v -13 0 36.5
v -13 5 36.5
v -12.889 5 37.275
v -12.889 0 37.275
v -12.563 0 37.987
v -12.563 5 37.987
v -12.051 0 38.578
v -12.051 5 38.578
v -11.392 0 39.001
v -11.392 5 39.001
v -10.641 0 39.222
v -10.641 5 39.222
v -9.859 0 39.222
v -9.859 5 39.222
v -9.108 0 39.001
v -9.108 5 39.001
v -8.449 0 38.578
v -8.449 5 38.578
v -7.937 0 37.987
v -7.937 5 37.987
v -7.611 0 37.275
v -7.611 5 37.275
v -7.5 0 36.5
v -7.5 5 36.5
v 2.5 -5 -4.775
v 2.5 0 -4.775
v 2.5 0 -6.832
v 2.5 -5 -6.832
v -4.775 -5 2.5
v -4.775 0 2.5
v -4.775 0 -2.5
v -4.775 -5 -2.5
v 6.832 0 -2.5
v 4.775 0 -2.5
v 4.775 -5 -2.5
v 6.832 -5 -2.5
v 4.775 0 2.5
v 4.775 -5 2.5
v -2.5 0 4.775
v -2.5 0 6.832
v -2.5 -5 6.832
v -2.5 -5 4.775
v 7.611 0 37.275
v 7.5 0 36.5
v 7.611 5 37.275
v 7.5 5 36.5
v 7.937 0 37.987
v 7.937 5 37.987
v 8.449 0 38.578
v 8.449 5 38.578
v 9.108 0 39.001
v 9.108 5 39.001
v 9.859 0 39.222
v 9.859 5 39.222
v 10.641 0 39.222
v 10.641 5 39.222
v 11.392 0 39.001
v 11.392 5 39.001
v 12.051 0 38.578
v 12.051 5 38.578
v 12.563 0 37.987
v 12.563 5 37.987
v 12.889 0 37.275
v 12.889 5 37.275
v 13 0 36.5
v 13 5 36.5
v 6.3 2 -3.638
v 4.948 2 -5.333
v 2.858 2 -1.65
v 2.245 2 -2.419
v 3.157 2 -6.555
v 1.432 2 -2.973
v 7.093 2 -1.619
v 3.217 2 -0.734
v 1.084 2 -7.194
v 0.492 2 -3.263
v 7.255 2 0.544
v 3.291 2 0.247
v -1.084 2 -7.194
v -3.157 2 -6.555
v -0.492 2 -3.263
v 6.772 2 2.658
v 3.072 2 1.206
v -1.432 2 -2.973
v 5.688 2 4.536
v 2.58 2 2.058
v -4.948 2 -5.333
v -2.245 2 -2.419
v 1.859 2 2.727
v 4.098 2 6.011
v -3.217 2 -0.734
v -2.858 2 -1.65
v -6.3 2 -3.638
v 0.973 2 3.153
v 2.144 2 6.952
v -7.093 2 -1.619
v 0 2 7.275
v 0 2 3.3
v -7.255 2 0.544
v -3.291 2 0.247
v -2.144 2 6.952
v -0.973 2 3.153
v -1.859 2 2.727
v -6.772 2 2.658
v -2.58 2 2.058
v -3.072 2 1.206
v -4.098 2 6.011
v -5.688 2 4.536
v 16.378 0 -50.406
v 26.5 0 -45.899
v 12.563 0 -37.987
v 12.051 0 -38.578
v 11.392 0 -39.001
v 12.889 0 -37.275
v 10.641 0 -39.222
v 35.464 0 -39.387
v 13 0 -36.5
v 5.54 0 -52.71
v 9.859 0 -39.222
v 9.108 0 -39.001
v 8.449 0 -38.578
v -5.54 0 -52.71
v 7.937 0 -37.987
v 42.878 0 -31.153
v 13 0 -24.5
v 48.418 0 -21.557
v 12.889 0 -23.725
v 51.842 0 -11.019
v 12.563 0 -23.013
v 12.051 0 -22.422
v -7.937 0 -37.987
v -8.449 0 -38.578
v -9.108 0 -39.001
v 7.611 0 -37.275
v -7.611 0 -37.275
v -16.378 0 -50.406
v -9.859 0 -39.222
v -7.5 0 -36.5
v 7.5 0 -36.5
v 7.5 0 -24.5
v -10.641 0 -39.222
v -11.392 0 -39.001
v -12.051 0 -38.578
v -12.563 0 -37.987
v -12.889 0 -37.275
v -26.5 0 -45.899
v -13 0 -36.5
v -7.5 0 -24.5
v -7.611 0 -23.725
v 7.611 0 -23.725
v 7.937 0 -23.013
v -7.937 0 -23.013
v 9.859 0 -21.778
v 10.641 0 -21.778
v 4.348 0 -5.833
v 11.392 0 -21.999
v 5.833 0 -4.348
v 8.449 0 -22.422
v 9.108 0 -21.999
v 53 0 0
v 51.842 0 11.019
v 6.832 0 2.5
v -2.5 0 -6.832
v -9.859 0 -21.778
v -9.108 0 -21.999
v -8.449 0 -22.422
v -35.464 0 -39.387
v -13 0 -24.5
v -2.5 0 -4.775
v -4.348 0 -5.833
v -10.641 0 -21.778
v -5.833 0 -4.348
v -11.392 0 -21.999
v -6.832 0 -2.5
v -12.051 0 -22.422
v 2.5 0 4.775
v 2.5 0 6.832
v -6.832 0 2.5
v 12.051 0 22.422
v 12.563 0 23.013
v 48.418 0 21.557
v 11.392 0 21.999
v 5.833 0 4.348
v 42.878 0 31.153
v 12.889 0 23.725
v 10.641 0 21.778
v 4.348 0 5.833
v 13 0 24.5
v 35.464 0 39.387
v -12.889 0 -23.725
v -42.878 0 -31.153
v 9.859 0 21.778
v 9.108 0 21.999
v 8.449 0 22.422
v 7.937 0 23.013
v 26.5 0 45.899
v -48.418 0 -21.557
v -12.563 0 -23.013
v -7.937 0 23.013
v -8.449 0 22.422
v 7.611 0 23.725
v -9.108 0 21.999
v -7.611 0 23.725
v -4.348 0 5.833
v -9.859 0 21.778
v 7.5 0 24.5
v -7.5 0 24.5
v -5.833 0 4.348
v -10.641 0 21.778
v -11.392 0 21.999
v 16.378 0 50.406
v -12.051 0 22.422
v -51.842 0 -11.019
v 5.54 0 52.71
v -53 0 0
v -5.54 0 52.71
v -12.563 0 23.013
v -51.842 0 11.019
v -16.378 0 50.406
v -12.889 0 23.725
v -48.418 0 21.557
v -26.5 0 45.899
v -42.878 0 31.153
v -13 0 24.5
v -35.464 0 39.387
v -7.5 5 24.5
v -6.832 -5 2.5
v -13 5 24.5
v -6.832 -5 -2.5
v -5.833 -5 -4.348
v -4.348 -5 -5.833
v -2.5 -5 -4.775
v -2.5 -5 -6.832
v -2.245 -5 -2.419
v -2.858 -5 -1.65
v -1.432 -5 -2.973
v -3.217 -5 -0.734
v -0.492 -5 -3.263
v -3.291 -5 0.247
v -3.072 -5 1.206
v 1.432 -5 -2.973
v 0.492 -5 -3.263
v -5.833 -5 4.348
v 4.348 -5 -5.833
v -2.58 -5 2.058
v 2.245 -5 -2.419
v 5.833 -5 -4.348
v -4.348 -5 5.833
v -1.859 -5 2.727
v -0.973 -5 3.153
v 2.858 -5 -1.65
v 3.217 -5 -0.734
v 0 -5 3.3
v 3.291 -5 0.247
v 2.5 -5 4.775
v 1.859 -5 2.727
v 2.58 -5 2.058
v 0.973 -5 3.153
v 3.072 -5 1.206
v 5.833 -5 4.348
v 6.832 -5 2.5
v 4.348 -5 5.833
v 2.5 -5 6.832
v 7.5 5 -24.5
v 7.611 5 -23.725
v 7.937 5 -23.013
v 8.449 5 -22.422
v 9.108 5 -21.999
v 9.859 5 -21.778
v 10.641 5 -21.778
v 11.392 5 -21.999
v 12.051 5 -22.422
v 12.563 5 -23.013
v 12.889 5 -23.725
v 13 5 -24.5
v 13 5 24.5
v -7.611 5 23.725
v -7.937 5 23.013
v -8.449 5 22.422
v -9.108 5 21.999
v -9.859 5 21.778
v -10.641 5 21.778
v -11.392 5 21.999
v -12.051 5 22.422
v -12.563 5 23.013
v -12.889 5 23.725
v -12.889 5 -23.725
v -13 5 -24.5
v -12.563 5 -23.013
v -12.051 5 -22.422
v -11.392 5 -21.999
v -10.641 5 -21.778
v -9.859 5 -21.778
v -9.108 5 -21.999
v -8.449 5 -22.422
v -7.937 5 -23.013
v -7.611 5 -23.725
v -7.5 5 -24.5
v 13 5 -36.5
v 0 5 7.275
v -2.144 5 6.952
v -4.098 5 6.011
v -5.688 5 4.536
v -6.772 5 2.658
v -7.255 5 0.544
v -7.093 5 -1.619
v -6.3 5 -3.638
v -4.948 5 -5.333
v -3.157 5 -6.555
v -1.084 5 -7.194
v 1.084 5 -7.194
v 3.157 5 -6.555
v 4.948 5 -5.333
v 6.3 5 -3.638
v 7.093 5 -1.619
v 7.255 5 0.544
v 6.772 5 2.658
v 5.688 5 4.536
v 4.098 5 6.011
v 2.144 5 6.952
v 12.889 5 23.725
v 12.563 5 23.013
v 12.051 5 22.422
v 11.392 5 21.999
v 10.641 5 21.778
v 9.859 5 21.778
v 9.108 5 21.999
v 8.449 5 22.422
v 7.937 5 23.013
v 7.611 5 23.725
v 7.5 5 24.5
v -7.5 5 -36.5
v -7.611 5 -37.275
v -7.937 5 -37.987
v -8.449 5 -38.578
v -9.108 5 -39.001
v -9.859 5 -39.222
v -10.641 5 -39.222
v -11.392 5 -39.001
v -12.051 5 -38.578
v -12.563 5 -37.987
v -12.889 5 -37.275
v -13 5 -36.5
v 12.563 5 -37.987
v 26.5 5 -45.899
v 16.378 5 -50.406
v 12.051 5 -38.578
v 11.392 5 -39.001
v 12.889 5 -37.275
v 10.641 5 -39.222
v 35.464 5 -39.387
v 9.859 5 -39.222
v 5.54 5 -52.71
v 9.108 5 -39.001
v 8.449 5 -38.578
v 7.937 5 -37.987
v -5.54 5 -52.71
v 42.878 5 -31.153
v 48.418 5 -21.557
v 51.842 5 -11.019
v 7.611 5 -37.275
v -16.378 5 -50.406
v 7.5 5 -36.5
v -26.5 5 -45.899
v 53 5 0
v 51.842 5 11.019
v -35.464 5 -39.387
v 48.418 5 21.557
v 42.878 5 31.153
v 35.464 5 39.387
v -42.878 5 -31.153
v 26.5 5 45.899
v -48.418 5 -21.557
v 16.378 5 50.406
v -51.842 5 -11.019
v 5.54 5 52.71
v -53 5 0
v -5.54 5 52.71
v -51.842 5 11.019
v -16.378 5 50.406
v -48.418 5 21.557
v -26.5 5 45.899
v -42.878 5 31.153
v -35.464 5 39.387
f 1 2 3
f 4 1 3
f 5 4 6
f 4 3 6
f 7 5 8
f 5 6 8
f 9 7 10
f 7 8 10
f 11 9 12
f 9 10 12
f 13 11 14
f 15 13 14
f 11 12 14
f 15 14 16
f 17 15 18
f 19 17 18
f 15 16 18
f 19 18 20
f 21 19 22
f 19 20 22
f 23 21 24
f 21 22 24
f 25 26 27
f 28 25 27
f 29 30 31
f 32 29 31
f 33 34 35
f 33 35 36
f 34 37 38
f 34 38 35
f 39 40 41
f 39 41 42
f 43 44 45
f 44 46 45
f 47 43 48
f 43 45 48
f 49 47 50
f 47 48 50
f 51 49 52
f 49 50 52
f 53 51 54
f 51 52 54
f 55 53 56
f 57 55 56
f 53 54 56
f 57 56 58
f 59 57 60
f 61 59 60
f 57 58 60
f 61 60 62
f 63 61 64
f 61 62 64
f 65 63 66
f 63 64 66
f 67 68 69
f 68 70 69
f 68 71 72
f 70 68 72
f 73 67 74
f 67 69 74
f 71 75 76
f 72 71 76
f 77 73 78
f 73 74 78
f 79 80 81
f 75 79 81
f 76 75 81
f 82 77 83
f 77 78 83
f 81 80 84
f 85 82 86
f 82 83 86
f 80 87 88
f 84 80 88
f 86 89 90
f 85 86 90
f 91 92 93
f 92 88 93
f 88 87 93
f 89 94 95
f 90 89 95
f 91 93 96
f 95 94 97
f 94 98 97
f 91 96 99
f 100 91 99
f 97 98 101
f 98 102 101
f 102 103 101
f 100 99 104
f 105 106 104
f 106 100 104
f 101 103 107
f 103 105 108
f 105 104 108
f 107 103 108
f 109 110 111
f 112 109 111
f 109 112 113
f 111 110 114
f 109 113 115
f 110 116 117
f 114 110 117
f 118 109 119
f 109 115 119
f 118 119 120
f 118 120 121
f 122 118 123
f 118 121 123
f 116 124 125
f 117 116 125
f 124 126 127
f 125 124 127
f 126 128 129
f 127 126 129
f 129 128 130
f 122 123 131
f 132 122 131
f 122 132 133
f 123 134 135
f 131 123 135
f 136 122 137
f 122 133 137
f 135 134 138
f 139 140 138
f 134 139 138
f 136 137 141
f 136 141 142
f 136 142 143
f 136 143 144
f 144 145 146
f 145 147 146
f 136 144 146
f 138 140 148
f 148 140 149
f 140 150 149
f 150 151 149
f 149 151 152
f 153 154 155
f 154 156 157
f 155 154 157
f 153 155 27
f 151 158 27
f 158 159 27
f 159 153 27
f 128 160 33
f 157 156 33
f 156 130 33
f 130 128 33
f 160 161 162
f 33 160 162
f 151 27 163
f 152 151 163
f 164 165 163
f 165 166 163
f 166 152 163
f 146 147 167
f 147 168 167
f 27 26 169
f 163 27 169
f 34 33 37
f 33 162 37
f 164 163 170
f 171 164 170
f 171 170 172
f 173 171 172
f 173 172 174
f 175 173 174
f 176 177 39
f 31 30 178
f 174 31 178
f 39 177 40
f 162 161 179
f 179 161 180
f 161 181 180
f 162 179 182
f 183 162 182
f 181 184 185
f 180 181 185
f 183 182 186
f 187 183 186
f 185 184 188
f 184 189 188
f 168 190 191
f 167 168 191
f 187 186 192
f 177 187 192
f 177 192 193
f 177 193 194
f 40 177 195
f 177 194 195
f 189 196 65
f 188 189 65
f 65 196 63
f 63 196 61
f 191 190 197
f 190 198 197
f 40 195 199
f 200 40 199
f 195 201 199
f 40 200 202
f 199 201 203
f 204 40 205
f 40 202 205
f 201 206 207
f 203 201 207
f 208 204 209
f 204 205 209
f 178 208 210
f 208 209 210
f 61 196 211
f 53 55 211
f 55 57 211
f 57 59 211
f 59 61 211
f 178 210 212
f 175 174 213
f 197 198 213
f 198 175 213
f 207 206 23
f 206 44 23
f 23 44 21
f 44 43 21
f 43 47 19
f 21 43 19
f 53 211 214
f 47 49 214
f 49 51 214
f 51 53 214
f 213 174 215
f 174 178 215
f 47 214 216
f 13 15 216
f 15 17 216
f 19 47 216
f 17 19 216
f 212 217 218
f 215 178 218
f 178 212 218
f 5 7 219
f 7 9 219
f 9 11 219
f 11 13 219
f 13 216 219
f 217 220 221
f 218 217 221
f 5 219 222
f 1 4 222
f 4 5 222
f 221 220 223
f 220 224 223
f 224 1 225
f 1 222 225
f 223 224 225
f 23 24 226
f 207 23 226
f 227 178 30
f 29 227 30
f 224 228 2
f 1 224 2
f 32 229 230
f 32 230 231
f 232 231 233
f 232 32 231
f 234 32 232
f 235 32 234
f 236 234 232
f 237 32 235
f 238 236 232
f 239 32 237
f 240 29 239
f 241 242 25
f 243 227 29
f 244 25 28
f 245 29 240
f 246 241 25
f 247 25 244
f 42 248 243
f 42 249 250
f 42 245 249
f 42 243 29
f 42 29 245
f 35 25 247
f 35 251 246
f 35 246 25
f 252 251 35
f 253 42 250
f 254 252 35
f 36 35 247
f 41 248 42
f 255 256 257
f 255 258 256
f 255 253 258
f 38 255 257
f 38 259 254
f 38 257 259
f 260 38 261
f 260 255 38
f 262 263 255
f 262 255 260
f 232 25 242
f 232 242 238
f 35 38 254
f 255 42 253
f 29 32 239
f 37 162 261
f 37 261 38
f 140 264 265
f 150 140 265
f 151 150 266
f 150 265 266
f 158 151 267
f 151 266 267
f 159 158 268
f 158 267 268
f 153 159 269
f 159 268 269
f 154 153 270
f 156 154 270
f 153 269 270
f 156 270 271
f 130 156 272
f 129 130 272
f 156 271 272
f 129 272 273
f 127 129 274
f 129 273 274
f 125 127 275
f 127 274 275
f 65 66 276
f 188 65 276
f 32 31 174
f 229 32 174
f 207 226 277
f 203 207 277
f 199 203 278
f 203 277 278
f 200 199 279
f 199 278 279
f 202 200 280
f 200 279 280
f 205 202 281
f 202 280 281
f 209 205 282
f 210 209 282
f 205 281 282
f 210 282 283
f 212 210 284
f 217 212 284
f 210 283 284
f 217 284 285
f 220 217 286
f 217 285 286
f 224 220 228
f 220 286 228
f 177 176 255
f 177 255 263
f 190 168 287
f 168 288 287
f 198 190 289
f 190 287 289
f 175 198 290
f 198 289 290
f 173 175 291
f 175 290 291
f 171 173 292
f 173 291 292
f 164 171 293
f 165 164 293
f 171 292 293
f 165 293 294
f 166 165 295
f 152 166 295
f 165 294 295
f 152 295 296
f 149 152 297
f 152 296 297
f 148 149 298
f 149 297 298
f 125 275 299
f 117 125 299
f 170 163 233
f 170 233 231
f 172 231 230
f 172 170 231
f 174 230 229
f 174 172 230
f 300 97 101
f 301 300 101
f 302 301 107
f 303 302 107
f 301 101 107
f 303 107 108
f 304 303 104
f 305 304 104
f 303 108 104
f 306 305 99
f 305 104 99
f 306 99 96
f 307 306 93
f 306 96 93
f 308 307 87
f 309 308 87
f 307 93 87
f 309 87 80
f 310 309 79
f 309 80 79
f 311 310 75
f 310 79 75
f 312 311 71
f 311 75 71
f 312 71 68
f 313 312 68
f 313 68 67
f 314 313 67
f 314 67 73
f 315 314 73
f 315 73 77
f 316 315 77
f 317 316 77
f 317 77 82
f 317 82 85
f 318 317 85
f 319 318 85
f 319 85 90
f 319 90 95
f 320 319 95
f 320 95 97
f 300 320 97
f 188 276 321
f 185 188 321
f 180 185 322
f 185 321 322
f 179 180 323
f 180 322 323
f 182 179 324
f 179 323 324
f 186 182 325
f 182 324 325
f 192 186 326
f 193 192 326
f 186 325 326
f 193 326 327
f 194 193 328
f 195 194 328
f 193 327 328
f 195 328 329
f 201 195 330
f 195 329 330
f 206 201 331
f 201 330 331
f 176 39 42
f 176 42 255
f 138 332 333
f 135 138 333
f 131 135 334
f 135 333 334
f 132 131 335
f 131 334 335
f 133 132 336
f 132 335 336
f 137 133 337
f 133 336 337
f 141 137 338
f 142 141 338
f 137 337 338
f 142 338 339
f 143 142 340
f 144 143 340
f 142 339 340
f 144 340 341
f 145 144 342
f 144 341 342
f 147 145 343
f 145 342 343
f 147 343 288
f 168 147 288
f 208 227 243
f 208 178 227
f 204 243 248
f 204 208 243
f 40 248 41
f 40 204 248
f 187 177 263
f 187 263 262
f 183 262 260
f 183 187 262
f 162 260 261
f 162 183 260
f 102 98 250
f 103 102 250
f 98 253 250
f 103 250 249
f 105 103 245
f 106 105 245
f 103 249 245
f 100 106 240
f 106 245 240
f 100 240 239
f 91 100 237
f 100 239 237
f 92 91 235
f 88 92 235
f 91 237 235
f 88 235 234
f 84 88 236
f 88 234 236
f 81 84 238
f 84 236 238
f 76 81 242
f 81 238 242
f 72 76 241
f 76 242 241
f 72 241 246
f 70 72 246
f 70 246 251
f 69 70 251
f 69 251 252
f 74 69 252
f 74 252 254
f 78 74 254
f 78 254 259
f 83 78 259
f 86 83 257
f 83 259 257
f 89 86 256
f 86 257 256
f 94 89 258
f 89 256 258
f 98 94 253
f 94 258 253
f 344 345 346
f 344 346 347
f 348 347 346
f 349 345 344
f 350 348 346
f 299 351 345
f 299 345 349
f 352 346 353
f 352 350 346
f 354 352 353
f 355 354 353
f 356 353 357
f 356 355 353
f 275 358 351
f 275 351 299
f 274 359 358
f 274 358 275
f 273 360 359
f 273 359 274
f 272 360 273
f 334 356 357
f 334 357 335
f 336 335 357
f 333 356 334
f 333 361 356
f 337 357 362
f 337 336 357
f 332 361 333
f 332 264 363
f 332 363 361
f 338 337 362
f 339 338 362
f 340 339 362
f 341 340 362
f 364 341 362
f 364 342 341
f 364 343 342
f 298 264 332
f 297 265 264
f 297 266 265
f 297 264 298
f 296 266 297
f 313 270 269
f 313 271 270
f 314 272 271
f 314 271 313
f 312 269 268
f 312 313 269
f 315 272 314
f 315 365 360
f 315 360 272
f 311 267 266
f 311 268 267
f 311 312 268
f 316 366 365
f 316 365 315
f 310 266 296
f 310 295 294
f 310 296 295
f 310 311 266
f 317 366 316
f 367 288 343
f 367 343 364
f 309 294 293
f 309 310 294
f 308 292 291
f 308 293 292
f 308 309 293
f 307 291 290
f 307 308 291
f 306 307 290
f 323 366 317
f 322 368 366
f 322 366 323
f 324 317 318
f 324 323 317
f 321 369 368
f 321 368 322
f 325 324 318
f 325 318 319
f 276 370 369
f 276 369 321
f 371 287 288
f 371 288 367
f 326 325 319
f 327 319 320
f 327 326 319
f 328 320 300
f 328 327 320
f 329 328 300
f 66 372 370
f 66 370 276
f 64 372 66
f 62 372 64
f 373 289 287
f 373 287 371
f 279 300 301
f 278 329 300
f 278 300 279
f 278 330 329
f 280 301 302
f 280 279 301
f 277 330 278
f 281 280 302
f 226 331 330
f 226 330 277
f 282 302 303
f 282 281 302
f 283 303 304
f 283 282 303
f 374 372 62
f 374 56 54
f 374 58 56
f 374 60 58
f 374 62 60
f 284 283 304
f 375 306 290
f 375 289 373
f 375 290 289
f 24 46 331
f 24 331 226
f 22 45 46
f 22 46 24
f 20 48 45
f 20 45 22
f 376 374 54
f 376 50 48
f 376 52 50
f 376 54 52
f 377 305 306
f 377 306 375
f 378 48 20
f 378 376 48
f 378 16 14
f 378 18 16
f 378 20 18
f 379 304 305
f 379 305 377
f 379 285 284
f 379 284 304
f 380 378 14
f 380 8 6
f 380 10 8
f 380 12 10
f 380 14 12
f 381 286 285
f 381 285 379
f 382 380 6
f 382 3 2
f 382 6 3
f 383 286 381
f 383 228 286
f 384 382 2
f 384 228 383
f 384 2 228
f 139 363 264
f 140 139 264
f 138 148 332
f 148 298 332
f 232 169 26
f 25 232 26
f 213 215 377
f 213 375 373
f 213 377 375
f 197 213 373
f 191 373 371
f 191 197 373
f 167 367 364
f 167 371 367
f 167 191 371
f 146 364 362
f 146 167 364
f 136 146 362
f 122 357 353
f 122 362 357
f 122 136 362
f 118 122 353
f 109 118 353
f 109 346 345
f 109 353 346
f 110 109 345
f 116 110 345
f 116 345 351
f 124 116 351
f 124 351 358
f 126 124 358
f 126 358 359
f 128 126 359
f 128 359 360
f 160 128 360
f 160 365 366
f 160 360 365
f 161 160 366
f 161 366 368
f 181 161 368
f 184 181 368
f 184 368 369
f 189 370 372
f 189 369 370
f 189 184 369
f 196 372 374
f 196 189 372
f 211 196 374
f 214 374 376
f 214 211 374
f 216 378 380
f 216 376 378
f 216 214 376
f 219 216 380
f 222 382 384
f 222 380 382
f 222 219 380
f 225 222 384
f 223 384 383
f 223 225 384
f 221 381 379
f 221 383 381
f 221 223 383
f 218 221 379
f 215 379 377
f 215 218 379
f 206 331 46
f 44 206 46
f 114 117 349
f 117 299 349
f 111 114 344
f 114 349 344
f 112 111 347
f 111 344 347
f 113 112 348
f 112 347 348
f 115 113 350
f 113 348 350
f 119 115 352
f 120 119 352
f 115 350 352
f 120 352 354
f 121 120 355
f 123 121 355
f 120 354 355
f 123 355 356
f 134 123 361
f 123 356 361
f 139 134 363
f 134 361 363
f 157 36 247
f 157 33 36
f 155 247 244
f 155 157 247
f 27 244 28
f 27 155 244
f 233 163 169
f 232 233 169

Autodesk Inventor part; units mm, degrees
ref_plane "YZ Plane" through (0, 0, 0) normal (1, 0, 0) x (0, 1, 0)
ref_plane "XZ Plane" through (0, 0, 0) normal (0, 1, 0) x (-1, 0, 0)
ref_plane "XY Plane" through (0, 0, 0) normal (0, 0, 1) x (1, 0, 0)
sketch "Sketch1" plane through (0, 0, 0) normal (0, 1, 0) x (-1, 0, 0)
  circle A0 centre (0, 0) radius 53
  dimension "d0" = 106
extrude "Extrusion1" add sketch "Sketch1" along normal blind 5
sketch "Sketch2" plane through (0, 5, 0) normal (0, 1, 0) x (1, 0, 0)
  line L0 (13, -30.5) -> (13, 30.5) construction
  line L1 (13, 30.5) -> (-13, 30.5) construction
  line L2 (-13, 30.5) -> (-13, -30.5) construction
  line L3 (-13, -30.5) -> (13, -30.5) construction
  line L4 (13, -30.5) -> (-13, 30.5) construction
  line L5 (13, 30.5) -> (-13, -30.5) construction
  line L6 (-13, -30.5) -> (-10.25, -30.5)
  line L7 (-13, 30.5) -> (-10.25, 30.5)
  line L8 (13, -30.5) -> (10.25, -30.5) construction
  line L9 (13, 30.5) -> (10.25, 30.5)
  line L10 (10.25, -36.5) -> (10.25, -24.5) construction
  line L11 (13, -36.5) -> (13, -24.5)
  line L12 (7.5, -24.5) -> (7.5, -36.5)
  arc A0 (7.5, -36.5) -> (13, -36.5) centre (10.25, -36.5) ccw
  arc A1 (13, -24.5) -> (7.5, -24.5) centre (10.25, -24.5) ccw
  line L13 (-7.5, -36.5) -> (-7.5, -24.5)
  line L14 (-13, -24.5) -> (-13, -36.5)
  arc A2 (-13, -36.5) -> (-7.5, -36.5) centre (-10.25, -36.5) ccw
  arc A3 (-7.5, -24.5) -> (-13, -24.5) centre (-10.25, -24.5) ccw
  line L15 (13, 24.5) -> (13, 36.5)
  line L16 (7.5, 36.5) -> (7.5, 24.5)
  arc A4 (7.5, 24.5) -> (13, 24.5) centre (10.25, 24.5) ccw
  arc A5 (13, 36.5) -> (7.5, 36.5) centre (10.25, 36.5) ccw
  line L17 (-7.5, 24.5) -> (-7.5, 36.5)
  line L18 (-13, 36.5) -> (-13, 24.5)
  arc A6 (-13, 24.5) -> (-7.5, 24.5) centre (-10.25, 24.5) ccw
  arc A7 (-7.5, 36.5) -> (-13, 36.5) centre (-10.25, 36.5) ccw
  point P0 (0, 0)
  point P1 (0, 0)
  dimension "d3" = 61
  dimension "d4" = 26
  dimension "d5" = 2.75
  dimension "d6" = 2.75
  dimension "d7" = 2.75
  dimension "d8" = 2.75
  dimension "d9" = 6
  dimension "d10" = 5.5
  dimension "d11" = 6
  dimension "d12" = 5.5
  dimension "d13" = 6
  dimension "d14" = 5.5
  dimension "d15" = 6
  dimension "d16" = 5.5
extrude "Extrusion2" cut sketch "Sketch2" against normal through all
sketch "Sketch3" plane through (0, 0, 0) normal (0, -1, 0) x (1, 0, 0)
  circle A0 centre (0, 0) radius 7.275
  line L0 (7.275, 0) -> (-7.275, 0) construction
  line L1 (0, 7.275) -> (0, -7.275) construction
  line L2 (9.775, 2.5) -> (4.775, 2.5)
  line L3 (4.775, 2.5) -> (4.775, -2.5)
  line L4 (4.775, -2.5) -> (9.775, -2.5)
  line L5 (9.775, -2.5) -> (9.775, 2.5)
  line L6 (9.775, 2.5) -> (4.775, -2.5) construction
  line L7 (4.775, 2.5) -> (9.775, -2.5) construction
  line L8 (2.5, 9.775) -> (-2.5, 9.775)
  line L9 (-2.5, 9.775) -> (-2.5, 4.775)
  line L10 (-2.5, 4.775) -> (2.5, 4.775)
  line L11 (2.5, 4.775) -> (2.5, 9.775)
  line L12 (2.5, 9.775) -> (-2.5, 4.775) construction
  line L13 (-2.5, 9.775) -> (2.5, 4.775) construction
  line L14 (-9.775, 2.5) -> (-4.775, 2.5)
  line L15 (-4.775, 2.5) -> (-4.775, -2.5)
  line L16 (-4.775, -2.5) -> (-9.775, -2.5)
  line L17 (-9.775, -2.5) -> (-9.775, 2.5)
  line L18 (-9.775, 2.5) -> (-4.775, -2.5) construction
  line L19 (-4.775, 2.5) -> (-9.775, -2.5) construction
  line L20 (-2.5, -4.775) -> (2.5, -4.775)
  line L21 (2.5, -4.775) -> (2.5, -9.775)
  line L22 (2.5, -9.775) -> (-2.5, -9.775)
  line L23 (-2.5, -9.775) -> (-2.5, -4.775)
  line L24 (-2.5, -4.775) -> (2.5, -9.775) construction
  line L25 (2.5, -4.775) -> (-2.5, -9.775) construction
  point P0 (6.832, 2.5)
  point P1 (2.5, 6.832)
  point P2 (-2.5, 6.832)
  point P3 (-6.832, 2.5)
  point P4 (-6.832, -2.5)
  point P5 (-2.5, -6.832)
  point P6 (2.5, -6.832)
  point P7 (6.832, -2.5)
  dimension "d20" = 14.55
  dimension "d21" = 5
  dimension "d22" = 5
  dimension "d23" = 5
  dimension "d24" = 5
  dimension "d25" = 5
  dimension "d26" = 5
  dimension "d27" = 5
  dimension "d28" = 5
extrude "Extrusion3" add sketch "Sketch3" along normal blind 5 contours L2 L3 L4 A0 L21 L20 L23 L16 L15 L14 L9 L10 L11
hole "Hole1" at (0, 5, 0) direction (0, -1, 0) diameter 6.6 end through all counterbore diameter 14.55 counterbore depth 3 clearance for "Hex Head Bolt" size "M6" standard "Ansi Metric M Profile"
properties part number "BaseGear" material "ABS Plastic"
